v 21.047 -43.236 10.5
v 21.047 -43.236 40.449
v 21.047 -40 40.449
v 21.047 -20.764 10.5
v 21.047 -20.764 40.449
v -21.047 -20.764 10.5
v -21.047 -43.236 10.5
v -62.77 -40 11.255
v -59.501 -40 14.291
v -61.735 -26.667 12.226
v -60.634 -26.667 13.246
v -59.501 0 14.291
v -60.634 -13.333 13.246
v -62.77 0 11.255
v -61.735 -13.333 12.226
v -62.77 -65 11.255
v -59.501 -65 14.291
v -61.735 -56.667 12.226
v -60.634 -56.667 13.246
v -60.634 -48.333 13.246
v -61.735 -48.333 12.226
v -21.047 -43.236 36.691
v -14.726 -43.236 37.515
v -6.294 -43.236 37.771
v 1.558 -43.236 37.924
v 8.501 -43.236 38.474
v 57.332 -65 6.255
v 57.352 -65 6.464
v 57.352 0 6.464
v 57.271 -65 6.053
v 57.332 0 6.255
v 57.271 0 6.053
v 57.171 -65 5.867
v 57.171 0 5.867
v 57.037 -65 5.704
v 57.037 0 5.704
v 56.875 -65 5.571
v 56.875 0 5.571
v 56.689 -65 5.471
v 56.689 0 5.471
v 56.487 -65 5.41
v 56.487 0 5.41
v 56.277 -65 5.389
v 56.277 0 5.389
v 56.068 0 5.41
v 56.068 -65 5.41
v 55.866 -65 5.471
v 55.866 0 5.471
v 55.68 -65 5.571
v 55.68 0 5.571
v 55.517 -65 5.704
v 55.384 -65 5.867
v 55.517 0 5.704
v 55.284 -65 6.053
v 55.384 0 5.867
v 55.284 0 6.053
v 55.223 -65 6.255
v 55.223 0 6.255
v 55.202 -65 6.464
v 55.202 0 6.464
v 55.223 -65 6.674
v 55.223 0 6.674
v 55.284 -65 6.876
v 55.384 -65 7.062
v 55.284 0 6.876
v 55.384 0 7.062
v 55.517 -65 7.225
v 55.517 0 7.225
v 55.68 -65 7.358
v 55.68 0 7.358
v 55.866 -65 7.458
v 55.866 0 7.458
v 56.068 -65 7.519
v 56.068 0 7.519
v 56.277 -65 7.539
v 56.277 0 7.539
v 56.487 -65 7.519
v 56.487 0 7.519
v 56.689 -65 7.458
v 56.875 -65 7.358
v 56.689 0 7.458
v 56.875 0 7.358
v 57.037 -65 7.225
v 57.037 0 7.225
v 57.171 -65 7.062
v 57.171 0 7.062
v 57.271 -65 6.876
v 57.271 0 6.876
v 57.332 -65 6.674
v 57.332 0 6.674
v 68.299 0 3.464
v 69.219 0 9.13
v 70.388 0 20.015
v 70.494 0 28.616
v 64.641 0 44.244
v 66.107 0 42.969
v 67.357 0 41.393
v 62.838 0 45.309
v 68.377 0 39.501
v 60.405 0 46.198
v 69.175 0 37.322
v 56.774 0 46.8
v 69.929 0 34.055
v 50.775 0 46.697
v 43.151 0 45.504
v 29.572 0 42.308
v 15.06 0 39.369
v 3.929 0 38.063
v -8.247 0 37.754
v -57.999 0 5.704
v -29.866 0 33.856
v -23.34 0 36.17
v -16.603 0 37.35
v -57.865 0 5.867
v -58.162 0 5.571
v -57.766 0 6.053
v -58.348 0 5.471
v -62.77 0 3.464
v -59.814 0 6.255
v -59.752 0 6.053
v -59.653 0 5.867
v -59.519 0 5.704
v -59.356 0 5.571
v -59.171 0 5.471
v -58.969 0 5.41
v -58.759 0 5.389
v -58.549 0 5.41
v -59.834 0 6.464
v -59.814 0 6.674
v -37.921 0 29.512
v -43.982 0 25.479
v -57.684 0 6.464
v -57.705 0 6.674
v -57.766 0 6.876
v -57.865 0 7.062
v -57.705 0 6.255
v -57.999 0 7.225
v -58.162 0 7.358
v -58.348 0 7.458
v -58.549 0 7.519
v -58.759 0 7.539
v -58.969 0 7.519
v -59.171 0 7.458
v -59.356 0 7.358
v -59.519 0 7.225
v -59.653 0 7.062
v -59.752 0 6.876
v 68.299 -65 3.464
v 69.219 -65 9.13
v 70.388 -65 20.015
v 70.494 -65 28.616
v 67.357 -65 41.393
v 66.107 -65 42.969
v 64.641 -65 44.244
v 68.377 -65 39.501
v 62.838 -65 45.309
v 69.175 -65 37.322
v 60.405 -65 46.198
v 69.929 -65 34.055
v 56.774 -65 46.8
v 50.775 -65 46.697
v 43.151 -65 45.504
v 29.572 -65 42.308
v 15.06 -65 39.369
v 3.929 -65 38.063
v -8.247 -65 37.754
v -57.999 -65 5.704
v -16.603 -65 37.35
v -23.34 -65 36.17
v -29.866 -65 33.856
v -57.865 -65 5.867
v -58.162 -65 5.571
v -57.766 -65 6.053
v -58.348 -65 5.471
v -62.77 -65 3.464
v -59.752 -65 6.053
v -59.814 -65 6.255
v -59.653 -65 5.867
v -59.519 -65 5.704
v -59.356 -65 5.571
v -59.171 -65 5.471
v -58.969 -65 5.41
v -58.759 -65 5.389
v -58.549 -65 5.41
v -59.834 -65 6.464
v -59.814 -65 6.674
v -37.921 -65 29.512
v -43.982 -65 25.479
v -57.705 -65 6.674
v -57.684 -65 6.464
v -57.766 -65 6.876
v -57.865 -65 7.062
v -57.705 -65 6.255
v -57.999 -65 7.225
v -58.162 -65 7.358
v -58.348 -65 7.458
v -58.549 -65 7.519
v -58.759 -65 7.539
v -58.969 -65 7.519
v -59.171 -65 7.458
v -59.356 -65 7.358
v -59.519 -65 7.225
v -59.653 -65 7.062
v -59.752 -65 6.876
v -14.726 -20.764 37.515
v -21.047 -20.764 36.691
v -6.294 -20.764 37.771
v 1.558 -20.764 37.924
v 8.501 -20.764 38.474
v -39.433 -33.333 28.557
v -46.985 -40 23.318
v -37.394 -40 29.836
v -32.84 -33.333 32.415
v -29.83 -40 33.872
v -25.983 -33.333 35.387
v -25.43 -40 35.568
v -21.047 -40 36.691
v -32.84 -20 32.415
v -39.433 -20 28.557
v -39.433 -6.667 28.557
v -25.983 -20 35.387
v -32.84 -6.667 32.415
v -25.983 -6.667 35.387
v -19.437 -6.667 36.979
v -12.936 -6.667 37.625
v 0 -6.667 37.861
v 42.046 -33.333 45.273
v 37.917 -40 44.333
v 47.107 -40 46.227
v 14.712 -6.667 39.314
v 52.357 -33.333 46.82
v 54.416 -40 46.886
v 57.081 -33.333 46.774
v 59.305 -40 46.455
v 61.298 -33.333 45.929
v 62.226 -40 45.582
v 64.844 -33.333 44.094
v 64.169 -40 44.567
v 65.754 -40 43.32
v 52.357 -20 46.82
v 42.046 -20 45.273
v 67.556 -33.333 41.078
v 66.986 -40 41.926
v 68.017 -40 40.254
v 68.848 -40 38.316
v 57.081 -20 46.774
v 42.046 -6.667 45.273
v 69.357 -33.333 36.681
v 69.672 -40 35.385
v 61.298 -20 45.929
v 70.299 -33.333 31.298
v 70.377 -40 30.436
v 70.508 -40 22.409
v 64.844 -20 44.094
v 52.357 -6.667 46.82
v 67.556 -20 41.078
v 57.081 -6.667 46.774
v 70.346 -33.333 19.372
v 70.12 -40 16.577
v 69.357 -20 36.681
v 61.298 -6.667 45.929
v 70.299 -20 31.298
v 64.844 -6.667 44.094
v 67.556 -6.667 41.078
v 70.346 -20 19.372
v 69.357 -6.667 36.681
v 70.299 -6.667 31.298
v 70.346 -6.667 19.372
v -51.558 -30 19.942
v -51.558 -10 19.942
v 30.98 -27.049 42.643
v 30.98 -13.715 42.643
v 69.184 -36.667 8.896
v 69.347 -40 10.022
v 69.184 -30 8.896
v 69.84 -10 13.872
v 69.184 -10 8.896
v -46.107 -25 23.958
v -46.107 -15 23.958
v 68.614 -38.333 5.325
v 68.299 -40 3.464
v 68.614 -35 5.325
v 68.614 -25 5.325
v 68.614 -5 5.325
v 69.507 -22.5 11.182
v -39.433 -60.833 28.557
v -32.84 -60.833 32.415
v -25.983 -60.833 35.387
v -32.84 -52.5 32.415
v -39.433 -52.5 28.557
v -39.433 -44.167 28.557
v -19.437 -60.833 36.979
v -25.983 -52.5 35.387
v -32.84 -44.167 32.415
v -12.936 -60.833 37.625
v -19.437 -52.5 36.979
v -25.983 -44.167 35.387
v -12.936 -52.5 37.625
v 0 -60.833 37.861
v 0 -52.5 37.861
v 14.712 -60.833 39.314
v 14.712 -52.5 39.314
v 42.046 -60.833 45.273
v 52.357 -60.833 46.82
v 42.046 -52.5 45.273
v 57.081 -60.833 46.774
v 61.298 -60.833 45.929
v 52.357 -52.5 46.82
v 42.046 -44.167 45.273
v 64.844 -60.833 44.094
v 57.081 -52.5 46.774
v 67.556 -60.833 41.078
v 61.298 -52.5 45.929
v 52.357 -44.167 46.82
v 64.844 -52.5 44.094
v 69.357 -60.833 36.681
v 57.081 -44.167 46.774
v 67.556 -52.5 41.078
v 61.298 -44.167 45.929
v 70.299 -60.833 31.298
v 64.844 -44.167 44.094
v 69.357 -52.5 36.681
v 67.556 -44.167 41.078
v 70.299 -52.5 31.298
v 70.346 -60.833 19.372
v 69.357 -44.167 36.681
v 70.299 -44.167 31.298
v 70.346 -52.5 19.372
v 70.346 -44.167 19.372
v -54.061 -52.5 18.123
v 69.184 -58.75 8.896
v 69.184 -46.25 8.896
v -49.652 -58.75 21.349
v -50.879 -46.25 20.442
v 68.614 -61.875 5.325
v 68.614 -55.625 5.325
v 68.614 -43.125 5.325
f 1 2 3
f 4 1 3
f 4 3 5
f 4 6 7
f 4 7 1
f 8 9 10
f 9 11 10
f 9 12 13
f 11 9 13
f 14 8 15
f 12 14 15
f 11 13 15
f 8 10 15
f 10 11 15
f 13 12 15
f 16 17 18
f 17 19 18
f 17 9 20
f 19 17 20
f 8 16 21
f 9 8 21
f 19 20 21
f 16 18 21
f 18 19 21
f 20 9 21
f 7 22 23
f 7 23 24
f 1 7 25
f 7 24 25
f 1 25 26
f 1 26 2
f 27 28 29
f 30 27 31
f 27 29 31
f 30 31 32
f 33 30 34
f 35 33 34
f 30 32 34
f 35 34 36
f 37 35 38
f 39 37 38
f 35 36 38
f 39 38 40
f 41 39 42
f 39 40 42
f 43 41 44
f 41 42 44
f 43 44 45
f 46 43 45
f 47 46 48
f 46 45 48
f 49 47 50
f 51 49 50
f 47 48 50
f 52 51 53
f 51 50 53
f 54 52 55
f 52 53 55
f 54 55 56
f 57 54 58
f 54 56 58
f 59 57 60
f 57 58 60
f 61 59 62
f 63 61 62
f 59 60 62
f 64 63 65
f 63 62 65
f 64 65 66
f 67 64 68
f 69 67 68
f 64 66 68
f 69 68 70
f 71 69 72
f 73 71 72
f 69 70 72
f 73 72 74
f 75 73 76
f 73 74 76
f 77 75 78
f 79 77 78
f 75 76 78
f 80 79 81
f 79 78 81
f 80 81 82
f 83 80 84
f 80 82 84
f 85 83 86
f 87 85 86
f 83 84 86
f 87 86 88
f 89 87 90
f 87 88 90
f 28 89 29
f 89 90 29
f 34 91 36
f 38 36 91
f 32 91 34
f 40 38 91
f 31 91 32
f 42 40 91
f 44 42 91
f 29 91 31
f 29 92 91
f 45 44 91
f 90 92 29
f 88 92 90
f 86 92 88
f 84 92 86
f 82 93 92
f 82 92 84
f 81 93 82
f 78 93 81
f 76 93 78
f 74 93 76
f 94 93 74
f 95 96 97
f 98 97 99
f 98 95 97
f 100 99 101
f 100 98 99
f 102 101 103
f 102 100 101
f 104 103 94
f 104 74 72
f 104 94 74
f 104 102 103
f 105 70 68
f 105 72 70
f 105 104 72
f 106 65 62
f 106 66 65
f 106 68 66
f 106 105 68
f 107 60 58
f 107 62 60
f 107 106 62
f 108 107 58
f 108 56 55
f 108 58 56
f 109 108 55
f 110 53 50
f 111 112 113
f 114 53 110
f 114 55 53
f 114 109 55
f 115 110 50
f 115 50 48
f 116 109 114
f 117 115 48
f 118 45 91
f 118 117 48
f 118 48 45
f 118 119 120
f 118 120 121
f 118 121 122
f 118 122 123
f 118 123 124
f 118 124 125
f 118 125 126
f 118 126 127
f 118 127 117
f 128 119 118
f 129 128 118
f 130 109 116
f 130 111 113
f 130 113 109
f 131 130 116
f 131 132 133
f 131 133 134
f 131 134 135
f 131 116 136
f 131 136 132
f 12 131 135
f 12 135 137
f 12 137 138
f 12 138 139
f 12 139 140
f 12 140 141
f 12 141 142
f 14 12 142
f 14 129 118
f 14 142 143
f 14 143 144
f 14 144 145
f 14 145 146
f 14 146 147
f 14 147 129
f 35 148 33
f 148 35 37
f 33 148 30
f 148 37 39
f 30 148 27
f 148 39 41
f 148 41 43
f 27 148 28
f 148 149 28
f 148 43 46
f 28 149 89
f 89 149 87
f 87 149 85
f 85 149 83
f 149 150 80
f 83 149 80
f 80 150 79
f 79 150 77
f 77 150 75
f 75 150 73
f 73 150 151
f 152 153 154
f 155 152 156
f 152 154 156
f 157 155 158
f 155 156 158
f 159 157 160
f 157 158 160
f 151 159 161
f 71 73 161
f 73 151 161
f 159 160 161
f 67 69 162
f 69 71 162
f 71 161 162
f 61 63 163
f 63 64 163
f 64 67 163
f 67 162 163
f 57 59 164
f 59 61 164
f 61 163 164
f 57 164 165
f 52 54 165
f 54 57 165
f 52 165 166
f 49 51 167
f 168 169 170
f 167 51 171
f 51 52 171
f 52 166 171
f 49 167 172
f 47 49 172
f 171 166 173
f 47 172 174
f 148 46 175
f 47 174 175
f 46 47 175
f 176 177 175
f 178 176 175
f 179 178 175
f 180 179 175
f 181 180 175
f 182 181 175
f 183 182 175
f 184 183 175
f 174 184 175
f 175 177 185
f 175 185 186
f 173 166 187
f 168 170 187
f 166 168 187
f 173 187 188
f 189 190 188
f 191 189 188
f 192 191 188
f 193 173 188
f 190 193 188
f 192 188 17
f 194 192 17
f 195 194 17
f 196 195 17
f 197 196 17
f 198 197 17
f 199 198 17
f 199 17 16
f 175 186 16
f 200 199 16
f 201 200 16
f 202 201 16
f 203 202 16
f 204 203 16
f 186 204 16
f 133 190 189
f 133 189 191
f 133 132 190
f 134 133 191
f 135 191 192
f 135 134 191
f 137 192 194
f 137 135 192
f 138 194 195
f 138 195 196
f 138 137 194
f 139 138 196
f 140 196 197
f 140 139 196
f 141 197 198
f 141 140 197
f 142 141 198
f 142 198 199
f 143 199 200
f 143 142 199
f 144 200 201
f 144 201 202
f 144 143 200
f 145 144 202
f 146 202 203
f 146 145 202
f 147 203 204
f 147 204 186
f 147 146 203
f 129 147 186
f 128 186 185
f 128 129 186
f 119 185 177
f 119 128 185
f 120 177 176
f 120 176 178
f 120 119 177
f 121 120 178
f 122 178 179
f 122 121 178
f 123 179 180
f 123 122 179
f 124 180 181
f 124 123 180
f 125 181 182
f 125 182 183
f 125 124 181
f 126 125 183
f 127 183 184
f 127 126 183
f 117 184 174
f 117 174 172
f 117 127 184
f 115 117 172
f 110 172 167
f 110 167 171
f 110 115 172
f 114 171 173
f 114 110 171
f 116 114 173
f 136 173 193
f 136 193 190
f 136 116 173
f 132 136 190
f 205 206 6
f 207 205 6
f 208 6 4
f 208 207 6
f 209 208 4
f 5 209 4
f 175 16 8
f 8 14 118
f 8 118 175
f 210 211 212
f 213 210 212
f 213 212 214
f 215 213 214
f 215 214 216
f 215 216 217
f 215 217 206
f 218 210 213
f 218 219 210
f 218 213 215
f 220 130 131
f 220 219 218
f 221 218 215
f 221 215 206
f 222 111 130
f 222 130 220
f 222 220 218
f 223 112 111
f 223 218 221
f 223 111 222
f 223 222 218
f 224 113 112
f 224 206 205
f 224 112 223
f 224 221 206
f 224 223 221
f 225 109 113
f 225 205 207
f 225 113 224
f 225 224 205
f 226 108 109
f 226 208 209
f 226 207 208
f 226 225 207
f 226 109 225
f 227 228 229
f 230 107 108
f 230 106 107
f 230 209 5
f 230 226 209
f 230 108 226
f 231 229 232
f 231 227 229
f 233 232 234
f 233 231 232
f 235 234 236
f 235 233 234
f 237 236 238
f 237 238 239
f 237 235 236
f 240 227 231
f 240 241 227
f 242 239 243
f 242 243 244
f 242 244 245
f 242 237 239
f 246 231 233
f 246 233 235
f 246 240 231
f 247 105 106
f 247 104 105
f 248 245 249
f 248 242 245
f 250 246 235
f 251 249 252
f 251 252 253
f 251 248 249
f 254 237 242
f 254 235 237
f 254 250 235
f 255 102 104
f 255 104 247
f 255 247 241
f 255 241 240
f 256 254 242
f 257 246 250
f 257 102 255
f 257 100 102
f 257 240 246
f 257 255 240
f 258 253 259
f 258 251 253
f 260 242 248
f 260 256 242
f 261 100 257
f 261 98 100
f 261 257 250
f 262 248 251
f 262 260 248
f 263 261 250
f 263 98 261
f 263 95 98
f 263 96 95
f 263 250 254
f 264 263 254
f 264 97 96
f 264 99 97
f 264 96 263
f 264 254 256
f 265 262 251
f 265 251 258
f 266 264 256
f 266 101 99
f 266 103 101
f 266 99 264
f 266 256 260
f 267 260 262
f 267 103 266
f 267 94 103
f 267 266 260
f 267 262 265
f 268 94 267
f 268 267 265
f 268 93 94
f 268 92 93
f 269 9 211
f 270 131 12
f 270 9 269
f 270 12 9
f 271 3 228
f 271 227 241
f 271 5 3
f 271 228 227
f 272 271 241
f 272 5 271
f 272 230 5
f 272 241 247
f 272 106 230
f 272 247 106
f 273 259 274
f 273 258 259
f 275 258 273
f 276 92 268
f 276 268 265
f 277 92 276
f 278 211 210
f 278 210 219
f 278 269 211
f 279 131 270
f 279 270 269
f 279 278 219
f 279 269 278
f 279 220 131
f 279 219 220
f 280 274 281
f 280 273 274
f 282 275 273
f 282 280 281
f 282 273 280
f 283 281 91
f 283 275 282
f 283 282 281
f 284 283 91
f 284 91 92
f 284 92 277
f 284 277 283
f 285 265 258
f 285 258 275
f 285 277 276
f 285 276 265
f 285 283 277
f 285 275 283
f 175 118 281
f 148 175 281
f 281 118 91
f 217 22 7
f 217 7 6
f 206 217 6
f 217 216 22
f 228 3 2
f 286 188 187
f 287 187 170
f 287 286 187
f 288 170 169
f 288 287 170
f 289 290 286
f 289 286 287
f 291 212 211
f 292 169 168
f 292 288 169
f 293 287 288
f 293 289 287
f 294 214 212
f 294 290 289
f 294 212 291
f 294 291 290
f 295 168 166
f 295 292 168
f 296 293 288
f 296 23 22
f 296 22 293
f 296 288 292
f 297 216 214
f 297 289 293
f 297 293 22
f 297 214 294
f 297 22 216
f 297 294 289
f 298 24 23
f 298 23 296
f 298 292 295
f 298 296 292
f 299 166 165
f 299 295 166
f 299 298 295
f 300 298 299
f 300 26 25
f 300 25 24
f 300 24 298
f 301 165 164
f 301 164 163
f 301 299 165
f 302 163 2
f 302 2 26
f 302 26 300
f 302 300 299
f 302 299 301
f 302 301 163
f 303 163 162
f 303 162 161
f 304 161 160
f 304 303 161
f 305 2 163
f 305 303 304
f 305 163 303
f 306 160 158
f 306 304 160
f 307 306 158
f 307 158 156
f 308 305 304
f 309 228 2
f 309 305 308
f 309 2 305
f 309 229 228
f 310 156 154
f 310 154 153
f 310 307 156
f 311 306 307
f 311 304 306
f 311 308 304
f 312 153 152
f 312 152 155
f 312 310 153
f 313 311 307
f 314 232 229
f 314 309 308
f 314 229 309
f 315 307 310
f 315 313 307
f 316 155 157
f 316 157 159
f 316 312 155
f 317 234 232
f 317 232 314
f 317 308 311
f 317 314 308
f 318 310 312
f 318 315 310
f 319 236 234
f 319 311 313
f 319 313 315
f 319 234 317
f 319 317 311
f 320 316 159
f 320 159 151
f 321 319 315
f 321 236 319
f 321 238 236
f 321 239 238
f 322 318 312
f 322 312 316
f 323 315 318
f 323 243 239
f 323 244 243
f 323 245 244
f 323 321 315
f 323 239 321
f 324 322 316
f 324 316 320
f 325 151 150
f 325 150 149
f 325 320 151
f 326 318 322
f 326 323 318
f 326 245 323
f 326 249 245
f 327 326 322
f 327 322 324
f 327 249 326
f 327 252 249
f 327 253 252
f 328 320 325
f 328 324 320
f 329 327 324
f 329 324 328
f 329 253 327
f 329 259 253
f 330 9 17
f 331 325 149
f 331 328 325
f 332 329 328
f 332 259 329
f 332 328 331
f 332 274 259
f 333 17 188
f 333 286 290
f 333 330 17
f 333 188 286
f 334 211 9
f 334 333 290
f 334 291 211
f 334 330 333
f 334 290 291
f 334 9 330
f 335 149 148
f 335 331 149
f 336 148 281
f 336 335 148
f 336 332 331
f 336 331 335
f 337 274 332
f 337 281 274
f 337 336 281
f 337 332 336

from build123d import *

# Parameters (mm, degrees)
F0_R     = 1.075
F1_DEPTH = 40
F2_DEPTH = 25
F3_DEPTH = 65.0010001
F5_W     = 42.0936179509
F5_H     = 22.4716748974
F6_DEPTH = 40.4


# Not quite as in the source:
# - a feature names something its author has since deleted; it is built from what else it names


with BuildPart() as f1:
    # F0 (on Front) → F1 (new body)
    with BuildSketch(Plane.XZ):
        with BuildLine():
            add(Edge.make_bspline(
                [(-59.500822073, 14.2913783373), (-56.6408981002, 16.2758116459), (-50.3327268236, 20.6972197265), (-26.2112339189, 39.1341727928), (0.9123679388, 36.7351149169), (29.2581893858, 41.4607157621), (78.5918665024, 55.8092687145), (68.6338635649, 5.7447523544), (68.2987782308, 3.4644304492)],
                knots=[0, 0, 0, 0, 0.1037500168, 0.2704106474, 0.4297306838, 0.6063016403, 0.793211467, 0.984487029, 0.984487029, 0.984487029, 0.984487029], degree=3))
            add(Edge.make_bspline(
                [(-59.500822073, 14.2913783373), (-60.6397116048, 13.241840497), (-61.7786011366, 12.1923026567), (-62.7701834043, 11.2554590394)],
                knots=[0, 0, 0, 0, 0.2457457998, 0.2457457998, 0.2457457998, 0.2457457998], degree=3))
            Line((-62.7701834043, 11.2554590394), (-62.7701834043, 3.4644304492))
            Line((-62.7701834043, 3.4644304492), (56.2773359432, 3.4644304492))
            Line((56.2773359432, 3.4644304492), (68.2987782308, 3.4644304492))
        make_face()
        with Locations((-58.7591566145, 6.4644304492)):
            Circle(F0_R, mode=Mode.SUBTRACT)
        with BuildLine():
            ThreePointArc((57.3523359432, 6.4644304492), (57.0374757329, 5.7042906594), (56.2773359432, 5.3894304492))
            ThreePointArc((56.2773359432, 5.3894304492), (55.5171961534, 7.2245702389), (57.3523359432, 6.4644304492))
        make_face(mode=Mode.SUBTRACT)
    extrude(amount=F1_DEPTH)

    # F2 (add): a face of the model
    f2_faces = [f1.faces().sort_by_distance(p)[0] for p in [
        (12.7289792957, -40, 21.2534595653),
    ]]
    extrude(f2_faces, amount=F2_DEPTH)

    # F0 (on Front) → F3 (cut, through all)
    with BuildSketch(Plane.XZ):
        with Locations((-58.7591566145, 6.4644304492)):
            Circle(F0_R)
    extrude(amount=F3_DEPTH, mode=Mode.SUBTRACT)

    # F5 (on offset) → F6 (cut)
    with BuildSketch(Plane.XY.offset(50.9)):
        with Locations((0, -32)):
            Rectangle(F5_W, F5_H)
    extrude(amount=-F6_DEPTH, mode=Mode.SUBTRACT)


solid = f1.part
